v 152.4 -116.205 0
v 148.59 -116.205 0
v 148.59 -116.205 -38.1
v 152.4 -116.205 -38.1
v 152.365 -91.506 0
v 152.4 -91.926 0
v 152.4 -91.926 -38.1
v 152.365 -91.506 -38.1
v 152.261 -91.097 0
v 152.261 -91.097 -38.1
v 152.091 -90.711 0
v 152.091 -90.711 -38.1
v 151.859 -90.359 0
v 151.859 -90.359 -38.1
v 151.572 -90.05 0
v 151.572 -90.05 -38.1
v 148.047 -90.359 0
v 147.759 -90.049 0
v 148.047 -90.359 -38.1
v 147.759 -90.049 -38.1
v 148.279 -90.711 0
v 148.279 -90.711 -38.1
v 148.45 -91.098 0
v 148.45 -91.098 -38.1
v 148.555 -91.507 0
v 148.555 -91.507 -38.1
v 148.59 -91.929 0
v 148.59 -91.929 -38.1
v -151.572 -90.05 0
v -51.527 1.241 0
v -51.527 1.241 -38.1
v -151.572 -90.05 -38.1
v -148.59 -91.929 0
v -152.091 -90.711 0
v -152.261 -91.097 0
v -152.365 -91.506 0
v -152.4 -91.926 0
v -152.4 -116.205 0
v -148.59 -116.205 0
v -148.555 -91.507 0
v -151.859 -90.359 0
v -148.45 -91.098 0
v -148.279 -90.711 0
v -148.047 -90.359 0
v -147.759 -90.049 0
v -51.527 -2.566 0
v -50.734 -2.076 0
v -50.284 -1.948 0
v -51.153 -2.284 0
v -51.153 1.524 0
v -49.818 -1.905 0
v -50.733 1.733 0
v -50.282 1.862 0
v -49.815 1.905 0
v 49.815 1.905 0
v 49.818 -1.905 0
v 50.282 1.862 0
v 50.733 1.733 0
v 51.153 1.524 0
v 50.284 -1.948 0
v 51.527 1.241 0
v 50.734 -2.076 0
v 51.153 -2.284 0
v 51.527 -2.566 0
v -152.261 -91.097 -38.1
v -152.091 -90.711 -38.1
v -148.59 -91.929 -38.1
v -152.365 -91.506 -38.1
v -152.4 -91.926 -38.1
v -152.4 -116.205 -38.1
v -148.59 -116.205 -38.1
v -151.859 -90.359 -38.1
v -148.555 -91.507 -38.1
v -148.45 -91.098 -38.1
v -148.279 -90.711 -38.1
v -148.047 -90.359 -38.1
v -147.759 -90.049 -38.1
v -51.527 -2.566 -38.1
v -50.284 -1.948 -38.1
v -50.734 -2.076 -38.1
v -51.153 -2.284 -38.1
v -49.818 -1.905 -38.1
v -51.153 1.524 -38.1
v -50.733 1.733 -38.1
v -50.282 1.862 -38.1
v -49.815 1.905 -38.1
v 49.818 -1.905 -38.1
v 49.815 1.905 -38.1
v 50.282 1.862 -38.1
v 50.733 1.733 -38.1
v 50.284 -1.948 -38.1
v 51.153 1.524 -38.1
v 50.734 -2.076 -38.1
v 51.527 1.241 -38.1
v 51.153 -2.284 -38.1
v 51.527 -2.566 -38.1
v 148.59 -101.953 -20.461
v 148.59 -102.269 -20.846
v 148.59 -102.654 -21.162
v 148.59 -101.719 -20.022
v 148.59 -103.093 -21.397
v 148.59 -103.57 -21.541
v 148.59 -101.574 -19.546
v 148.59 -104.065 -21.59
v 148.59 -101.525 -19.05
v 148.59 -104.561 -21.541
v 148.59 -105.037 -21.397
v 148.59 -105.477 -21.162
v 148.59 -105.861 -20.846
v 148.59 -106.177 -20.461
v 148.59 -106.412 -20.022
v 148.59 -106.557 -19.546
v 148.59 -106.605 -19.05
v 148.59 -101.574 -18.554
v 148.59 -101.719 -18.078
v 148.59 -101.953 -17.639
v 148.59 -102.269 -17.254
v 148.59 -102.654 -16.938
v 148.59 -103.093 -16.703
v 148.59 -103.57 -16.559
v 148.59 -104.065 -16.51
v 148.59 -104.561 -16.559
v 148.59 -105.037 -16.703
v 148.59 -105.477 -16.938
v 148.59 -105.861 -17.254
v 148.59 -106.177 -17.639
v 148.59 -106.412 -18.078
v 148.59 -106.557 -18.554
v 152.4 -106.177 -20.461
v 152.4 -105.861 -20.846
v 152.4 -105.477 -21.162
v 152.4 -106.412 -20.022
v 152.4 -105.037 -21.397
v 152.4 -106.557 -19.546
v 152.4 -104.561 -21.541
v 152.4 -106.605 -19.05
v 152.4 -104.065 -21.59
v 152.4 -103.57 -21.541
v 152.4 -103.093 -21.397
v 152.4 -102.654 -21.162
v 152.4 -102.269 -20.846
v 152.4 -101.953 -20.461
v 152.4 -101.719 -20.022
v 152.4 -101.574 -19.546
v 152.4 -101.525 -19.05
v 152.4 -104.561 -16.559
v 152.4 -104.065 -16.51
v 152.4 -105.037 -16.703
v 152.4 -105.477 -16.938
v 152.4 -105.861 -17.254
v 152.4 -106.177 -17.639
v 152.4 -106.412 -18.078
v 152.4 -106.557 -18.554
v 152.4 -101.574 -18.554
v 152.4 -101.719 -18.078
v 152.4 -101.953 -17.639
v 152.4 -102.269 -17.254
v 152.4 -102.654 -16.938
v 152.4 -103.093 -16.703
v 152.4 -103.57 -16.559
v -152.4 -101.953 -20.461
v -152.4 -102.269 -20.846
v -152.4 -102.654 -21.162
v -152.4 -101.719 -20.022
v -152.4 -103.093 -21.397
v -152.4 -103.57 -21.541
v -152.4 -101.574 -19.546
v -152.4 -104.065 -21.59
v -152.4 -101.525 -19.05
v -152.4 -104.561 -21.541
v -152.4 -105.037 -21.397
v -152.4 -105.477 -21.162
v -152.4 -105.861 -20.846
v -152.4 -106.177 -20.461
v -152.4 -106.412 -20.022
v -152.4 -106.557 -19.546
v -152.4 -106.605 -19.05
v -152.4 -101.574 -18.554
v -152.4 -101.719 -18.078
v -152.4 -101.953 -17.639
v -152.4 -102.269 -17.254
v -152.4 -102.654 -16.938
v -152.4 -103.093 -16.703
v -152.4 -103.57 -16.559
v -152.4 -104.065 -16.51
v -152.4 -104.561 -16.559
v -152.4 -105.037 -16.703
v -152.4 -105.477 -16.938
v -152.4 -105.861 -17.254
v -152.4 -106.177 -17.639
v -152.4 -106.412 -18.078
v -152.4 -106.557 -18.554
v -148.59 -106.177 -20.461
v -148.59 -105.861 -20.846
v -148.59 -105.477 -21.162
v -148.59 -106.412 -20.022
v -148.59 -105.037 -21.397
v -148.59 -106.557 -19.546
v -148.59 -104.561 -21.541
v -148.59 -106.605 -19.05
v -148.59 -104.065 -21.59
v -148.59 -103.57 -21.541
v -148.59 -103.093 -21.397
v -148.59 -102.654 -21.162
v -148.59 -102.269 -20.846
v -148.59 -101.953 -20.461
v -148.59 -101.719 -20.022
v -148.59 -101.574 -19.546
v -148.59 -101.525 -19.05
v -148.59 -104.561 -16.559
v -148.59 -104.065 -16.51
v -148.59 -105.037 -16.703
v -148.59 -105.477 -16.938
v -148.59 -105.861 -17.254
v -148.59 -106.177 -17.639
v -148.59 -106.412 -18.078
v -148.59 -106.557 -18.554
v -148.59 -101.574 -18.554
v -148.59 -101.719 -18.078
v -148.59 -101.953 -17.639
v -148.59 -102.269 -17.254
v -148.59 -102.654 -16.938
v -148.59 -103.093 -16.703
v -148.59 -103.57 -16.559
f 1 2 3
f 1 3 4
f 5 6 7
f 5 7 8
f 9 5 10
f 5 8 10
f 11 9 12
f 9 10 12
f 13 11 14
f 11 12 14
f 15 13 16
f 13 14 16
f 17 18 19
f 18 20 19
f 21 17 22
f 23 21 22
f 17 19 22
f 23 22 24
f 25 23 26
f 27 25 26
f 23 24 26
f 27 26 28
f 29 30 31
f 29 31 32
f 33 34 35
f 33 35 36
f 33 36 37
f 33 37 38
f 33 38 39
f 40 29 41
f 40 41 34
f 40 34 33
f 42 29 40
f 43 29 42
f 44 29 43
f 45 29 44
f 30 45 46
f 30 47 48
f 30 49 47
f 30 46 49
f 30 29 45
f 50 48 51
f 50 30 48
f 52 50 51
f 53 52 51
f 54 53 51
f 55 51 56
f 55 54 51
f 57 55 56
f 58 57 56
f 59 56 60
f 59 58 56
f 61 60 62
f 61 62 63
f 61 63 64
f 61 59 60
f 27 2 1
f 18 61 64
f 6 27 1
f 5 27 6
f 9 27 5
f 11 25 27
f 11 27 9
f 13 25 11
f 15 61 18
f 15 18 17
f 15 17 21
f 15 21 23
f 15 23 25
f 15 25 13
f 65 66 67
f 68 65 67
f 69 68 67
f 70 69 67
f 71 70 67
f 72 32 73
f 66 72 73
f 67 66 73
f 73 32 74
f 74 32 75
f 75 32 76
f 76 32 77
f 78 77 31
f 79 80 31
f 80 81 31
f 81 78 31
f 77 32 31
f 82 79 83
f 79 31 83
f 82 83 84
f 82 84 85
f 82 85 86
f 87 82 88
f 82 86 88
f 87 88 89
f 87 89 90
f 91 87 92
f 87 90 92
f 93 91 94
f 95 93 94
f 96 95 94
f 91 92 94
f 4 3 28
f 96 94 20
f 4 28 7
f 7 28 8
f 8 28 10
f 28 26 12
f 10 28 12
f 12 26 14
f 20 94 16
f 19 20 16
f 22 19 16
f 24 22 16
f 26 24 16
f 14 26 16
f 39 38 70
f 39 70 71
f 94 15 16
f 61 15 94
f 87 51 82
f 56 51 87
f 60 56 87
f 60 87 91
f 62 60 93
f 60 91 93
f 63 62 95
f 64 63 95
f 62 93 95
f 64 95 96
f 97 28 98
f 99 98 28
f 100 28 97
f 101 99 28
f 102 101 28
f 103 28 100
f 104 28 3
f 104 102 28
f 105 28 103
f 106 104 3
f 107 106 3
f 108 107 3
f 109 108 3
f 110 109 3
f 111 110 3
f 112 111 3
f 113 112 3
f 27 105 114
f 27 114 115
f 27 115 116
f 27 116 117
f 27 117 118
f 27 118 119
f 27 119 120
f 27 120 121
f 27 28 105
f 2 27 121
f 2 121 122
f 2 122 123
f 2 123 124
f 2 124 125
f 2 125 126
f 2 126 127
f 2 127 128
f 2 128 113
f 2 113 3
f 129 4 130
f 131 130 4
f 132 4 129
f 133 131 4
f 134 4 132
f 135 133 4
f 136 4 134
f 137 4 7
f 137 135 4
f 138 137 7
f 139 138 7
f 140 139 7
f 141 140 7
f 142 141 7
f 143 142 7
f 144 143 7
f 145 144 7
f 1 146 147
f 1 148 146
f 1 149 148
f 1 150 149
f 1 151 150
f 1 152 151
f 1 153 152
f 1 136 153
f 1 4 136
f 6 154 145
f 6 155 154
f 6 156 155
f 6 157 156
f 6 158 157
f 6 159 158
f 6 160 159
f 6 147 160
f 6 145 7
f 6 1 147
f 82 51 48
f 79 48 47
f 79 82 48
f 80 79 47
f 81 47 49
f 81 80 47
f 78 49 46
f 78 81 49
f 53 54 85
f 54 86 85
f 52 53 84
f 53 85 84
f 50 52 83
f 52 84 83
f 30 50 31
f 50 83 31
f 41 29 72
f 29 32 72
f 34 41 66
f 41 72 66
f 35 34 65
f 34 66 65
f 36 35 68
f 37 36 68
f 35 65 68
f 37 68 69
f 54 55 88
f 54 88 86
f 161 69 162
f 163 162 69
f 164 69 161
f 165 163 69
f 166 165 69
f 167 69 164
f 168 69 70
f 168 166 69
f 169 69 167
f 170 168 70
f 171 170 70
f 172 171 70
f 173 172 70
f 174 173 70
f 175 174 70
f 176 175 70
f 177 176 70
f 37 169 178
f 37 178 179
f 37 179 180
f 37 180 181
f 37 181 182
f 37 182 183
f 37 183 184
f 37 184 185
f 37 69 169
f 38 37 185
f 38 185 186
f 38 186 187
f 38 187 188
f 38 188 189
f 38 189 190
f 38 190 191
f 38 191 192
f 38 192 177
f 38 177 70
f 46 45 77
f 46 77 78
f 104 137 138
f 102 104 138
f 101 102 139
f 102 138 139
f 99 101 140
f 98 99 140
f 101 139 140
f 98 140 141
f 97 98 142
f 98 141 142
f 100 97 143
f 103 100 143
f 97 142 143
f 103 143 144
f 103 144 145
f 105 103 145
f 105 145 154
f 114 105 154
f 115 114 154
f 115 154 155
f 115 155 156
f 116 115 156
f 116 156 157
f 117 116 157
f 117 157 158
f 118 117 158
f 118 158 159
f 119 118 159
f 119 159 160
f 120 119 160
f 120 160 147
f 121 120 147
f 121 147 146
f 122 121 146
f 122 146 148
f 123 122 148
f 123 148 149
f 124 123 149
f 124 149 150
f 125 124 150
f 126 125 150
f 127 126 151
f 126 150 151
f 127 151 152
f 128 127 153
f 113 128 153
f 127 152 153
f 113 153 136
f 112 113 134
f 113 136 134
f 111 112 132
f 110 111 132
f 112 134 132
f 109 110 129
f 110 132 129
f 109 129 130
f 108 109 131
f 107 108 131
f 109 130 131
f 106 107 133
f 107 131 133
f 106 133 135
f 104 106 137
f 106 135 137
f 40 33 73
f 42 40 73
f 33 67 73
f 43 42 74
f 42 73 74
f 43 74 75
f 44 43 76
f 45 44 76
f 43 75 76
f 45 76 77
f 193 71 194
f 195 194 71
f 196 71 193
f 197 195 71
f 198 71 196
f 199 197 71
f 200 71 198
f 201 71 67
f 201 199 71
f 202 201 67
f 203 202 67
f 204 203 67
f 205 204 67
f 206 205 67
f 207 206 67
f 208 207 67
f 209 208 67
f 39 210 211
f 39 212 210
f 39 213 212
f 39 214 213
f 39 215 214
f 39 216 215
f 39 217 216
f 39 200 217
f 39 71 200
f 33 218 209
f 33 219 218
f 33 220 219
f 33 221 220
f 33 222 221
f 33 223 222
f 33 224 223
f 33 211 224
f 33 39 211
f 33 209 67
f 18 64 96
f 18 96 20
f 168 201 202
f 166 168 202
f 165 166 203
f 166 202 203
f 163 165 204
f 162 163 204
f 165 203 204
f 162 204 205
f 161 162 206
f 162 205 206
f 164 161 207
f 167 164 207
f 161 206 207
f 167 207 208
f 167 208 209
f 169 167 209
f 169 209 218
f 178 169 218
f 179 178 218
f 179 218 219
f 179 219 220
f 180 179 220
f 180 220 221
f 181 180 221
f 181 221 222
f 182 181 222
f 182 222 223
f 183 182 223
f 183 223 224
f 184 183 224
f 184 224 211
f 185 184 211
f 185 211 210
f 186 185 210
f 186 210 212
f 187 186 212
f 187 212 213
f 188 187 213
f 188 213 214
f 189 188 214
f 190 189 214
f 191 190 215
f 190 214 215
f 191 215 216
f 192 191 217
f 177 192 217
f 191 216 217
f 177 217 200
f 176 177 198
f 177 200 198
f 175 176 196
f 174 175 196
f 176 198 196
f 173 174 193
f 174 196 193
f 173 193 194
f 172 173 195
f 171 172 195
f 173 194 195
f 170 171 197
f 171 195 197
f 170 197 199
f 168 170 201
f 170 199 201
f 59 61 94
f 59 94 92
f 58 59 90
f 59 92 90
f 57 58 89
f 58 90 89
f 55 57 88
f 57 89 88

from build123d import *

# Parameters (mm, degrees)
BOSS_EXTRUDE1_DEPTH = 38.1
FILLET1_R           = 2.54
SKETCH2_R           = 2.54
CUT_EXTRUDE1_DEPTH  = 329.417801017


with BuildPart() as part:
    # Sketch1 → Boss-Extrude1 (new body)
    with BuildSketch(Plane.XY):
        Polygon((-50.8, -1.905), (50.8, -1.905), (148.59, -90.805), (148.59, -116.205), (152.4, -116.205), (152.4, -90.805), (50.8, 1.905), (-50.8, 1.905), (-152.4, -90.805), (-152.4, -116.205), (-148.59, -116.205), (-148.59, -90.805), align=None)
    extrude(amount=-BOSS_EXTRUDE1_DEPTH)

    # Fillet1
    fillet1_edges = [part.edges().sort_by_distance(p)[0] for p in [
        (152.4, -90.805, -19.05),
        (148.59, -90.805, -19.05),
        (50.8, -1.905, -19.05),
        (-50.8, -1.905, -19.05),
        (-148.59, -90.805, -19.05),
        (-152.4, -90.805, -19.05),
        (-50.8, 1.905, -19.05),
        (50.8, 1.905, -19.05),
    ]]
    fillet(fillet1_edges, radius=FILLET1_R)

    # Sketch2 → Cut-Extrude1 (cut, through all)
    with BuildSketch(Plane(origin=(152.4, 0, 0), x_dir=(0, 0, -1), z_dir=(1, 0, 0))):
        with Locations((19.05, -104.065395562)):
            Circle(SKETCH2_R)
    extrude(amount=-CUT_EXTRUDE1_DEPTH, mode=Mode.SUBTRACT)


solid = part.part
